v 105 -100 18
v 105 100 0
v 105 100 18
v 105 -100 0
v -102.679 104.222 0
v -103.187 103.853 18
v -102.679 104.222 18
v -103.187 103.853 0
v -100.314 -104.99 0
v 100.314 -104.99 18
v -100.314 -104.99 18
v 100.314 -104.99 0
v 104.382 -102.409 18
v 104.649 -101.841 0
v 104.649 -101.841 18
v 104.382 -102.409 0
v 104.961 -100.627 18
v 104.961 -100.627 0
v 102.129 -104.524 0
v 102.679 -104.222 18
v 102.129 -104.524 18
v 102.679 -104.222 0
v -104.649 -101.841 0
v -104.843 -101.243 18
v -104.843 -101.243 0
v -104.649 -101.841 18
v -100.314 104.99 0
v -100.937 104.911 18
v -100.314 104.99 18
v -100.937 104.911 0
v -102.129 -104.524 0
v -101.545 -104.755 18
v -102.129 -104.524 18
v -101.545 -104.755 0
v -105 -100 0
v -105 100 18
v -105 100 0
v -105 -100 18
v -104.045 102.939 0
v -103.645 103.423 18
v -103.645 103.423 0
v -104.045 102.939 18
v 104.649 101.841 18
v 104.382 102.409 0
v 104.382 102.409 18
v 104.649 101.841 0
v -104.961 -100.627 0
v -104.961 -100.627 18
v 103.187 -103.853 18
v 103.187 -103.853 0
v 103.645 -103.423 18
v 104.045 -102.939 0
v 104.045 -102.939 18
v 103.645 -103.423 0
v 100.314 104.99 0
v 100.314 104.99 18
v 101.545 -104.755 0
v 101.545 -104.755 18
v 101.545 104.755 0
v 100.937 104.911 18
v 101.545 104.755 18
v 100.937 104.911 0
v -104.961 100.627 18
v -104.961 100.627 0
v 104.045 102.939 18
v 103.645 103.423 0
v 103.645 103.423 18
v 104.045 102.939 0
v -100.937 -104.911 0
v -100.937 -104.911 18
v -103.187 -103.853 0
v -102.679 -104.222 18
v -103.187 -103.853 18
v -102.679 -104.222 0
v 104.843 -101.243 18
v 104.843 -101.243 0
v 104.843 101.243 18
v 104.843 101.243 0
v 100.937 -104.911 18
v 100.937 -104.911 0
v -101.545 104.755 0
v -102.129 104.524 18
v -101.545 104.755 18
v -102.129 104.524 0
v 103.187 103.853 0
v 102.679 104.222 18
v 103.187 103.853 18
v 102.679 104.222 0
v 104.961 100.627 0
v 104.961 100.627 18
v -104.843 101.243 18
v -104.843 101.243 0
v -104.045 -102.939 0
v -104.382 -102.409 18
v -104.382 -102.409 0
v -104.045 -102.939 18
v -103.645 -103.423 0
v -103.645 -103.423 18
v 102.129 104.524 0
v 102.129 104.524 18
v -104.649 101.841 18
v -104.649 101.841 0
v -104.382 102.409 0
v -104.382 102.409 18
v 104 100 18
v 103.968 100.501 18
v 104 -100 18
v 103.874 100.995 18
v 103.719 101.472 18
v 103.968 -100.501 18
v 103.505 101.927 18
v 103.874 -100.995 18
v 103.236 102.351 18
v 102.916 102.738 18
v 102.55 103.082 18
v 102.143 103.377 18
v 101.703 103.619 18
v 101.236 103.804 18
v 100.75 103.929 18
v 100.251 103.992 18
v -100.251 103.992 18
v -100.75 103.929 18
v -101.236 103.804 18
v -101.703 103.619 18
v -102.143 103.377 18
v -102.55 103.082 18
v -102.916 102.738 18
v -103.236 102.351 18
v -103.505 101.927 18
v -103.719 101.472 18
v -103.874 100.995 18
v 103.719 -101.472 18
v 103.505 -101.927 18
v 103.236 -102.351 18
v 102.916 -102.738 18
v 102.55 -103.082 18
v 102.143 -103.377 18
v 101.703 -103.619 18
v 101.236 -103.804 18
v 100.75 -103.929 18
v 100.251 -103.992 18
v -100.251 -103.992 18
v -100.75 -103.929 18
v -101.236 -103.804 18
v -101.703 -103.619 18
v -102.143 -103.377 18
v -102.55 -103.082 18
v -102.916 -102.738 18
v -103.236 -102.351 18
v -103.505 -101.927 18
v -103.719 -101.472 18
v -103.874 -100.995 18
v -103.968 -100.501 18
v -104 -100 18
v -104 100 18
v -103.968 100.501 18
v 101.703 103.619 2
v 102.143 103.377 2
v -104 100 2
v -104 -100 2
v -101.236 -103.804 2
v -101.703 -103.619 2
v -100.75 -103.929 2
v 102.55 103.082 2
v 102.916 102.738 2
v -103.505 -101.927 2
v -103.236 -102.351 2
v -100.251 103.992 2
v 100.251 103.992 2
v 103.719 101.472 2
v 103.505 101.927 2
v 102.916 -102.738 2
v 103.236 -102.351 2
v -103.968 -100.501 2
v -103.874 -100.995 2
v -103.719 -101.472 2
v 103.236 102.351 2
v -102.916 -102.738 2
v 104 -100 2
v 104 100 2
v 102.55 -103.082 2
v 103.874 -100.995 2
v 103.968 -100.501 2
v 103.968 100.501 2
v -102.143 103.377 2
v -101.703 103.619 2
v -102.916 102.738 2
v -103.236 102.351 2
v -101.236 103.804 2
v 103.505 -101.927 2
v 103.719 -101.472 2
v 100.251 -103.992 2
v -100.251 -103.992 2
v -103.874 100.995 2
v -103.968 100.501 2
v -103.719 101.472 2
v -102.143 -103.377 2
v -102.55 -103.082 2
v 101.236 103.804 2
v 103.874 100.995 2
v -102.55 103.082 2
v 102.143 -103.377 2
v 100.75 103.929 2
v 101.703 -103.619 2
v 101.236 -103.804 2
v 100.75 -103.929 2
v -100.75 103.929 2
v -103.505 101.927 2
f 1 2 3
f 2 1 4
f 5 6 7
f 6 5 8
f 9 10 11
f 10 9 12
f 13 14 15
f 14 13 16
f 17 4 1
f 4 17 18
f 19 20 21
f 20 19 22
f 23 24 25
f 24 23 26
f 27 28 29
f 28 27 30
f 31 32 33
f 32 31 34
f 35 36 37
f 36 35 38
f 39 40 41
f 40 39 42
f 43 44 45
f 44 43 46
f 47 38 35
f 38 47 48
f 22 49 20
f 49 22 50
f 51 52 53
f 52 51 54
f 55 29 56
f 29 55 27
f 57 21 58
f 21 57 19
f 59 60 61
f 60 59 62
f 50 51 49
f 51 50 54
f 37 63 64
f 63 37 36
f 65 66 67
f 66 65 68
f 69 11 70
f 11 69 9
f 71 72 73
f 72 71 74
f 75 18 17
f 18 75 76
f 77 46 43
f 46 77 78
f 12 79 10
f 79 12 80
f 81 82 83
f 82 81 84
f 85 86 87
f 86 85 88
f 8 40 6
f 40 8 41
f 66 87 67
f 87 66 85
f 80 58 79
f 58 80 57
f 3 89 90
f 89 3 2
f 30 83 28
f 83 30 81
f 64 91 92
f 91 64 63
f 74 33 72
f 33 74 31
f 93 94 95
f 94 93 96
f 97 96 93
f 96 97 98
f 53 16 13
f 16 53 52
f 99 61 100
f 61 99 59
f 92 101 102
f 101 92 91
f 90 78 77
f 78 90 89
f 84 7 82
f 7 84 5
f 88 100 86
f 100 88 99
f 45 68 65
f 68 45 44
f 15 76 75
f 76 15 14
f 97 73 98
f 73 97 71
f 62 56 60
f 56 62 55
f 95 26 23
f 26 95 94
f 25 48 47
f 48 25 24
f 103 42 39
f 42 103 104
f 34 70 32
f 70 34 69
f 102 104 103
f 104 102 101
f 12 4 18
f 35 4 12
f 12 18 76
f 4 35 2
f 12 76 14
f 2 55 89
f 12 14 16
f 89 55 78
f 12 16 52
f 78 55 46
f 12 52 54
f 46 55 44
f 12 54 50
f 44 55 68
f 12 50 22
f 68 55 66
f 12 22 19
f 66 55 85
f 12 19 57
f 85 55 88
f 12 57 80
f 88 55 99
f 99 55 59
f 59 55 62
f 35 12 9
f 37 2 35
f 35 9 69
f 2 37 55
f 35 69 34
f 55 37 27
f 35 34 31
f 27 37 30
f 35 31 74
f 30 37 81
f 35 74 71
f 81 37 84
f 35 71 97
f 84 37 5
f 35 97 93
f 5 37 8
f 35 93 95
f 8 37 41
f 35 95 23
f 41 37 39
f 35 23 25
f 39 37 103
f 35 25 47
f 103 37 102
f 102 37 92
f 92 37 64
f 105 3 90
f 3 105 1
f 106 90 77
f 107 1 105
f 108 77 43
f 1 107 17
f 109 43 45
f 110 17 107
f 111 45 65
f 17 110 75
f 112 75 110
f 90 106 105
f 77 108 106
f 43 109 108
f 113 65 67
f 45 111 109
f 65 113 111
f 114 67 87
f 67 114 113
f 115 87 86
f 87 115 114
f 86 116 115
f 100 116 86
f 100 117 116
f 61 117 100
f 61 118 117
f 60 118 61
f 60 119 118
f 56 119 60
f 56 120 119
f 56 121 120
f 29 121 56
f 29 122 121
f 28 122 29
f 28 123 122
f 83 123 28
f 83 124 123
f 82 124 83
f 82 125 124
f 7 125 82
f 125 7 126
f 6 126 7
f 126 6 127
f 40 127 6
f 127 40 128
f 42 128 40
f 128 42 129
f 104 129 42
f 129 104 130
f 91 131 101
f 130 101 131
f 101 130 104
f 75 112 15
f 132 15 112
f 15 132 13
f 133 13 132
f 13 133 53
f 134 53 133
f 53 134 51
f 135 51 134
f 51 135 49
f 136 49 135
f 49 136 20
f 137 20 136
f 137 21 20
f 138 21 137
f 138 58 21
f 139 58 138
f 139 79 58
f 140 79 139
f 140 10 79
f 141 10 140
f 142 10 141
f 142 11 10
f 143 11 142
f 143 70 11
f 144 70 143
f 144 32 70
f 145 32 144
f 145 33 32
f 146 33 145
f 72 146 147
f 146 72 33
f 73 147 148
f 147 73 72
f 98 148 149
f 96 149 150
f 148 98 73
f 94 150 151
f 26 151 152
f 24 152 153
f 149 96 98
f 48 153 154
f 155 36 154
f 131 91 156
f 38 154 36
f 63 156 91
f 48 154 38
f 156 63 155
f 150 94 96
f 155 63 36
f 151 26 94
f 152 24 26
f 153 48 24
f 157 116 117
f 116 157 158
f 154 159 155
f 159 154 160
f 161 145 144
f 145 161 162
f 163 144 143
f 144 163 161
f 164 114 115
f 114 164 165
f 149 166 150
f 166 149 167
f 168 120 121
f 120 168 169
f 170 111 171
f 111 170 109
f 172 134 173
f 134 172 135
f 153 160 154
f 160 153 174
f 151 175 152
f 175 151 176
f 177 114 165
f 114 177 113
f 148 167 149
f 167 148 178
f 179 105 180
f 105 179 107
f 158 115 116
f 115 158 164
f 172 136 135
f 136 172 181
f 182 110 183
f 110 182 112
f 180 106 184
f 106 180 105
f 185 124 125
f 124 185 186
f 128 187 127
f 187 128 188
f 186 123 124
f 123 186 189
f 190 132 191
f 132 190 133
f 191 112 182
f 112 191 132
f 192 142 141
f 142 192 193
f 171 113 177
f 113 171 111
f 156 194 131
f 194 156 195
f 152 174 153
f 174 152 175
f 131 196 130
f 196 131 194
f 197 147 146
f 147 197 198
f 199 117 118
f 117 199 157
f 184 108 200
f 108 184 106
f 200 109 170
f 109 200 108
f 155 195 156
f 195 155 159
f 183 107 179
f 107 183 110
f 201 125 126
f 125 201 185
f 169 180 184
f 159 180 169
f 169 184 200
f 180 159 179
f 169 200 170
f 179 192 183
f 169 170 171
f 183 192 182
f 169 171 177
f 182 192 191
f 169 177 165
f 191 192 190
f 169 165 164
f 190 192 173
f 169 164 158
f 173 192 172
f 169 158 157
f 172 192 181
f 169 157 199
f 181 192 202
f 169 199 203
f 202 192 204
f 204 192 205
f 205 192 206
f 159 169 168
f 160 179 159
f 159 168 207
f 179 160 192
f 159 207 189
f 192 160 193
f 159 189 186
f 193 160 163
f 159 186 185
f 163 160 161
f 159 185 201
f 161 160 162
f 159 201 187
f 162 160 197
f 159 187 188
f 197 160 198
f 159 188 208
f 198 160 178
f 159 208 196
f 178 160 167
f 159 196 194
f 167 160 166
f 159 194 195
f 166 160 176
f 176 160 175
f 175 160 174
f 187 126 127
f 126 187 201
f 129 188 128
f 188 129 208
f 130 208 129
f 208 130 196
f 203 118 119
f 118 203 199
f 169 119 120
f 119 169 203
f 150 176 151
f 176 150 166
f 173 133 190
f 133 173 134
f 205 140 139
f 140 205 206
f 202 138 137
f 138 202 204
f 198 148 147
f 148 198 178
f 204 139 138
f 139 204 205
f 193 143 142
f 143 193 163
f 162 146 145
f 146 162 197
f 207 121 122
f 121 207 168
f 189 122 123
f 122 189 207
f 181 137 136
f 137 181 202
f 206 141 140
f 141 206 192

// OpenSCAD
$fn = 50;


difference() {
	union() {
		hull() {
			translate(v = [-100.0000000000, 100.0000000000, 0]) {
				cylinder(h = 18, r = 5);
			}
			translate(v = [100.0000000000, 100.0000000000, 0]) {
				cylinder(h = 18, r = 5);
			}
			translate(v = [-100.0000000000, -100.0000000000, 0]) {
				cylinder(h = 18, r = 5);
			}
			translate(v = [100.0000000000, -100.0000000000, 0]) {
				cylinder(h = 18, r = 5);
			}
		}
	}
	union() {
		translate(v = [0, 0, 2]) {
			hull() {
				translate(v = [-100.0000000000, 100.0000000000, 0]) {
					cylinder(h = 16, r = 4);
				}
				translate(v = [100.0000000000, 100.0000000000, 0]) {
					cylinder(h = 16, r = 4);
				}
				translate(v = [-100.0000000000, -100.0000000000, 0]) {
					cylinder(h = 16, r = 4);
				}
				translate(v = [100.0000000000, -100.0000000000, 0]) {
					cylinder(h = 16, r = 4);
				}
			}
		}
	}
}
